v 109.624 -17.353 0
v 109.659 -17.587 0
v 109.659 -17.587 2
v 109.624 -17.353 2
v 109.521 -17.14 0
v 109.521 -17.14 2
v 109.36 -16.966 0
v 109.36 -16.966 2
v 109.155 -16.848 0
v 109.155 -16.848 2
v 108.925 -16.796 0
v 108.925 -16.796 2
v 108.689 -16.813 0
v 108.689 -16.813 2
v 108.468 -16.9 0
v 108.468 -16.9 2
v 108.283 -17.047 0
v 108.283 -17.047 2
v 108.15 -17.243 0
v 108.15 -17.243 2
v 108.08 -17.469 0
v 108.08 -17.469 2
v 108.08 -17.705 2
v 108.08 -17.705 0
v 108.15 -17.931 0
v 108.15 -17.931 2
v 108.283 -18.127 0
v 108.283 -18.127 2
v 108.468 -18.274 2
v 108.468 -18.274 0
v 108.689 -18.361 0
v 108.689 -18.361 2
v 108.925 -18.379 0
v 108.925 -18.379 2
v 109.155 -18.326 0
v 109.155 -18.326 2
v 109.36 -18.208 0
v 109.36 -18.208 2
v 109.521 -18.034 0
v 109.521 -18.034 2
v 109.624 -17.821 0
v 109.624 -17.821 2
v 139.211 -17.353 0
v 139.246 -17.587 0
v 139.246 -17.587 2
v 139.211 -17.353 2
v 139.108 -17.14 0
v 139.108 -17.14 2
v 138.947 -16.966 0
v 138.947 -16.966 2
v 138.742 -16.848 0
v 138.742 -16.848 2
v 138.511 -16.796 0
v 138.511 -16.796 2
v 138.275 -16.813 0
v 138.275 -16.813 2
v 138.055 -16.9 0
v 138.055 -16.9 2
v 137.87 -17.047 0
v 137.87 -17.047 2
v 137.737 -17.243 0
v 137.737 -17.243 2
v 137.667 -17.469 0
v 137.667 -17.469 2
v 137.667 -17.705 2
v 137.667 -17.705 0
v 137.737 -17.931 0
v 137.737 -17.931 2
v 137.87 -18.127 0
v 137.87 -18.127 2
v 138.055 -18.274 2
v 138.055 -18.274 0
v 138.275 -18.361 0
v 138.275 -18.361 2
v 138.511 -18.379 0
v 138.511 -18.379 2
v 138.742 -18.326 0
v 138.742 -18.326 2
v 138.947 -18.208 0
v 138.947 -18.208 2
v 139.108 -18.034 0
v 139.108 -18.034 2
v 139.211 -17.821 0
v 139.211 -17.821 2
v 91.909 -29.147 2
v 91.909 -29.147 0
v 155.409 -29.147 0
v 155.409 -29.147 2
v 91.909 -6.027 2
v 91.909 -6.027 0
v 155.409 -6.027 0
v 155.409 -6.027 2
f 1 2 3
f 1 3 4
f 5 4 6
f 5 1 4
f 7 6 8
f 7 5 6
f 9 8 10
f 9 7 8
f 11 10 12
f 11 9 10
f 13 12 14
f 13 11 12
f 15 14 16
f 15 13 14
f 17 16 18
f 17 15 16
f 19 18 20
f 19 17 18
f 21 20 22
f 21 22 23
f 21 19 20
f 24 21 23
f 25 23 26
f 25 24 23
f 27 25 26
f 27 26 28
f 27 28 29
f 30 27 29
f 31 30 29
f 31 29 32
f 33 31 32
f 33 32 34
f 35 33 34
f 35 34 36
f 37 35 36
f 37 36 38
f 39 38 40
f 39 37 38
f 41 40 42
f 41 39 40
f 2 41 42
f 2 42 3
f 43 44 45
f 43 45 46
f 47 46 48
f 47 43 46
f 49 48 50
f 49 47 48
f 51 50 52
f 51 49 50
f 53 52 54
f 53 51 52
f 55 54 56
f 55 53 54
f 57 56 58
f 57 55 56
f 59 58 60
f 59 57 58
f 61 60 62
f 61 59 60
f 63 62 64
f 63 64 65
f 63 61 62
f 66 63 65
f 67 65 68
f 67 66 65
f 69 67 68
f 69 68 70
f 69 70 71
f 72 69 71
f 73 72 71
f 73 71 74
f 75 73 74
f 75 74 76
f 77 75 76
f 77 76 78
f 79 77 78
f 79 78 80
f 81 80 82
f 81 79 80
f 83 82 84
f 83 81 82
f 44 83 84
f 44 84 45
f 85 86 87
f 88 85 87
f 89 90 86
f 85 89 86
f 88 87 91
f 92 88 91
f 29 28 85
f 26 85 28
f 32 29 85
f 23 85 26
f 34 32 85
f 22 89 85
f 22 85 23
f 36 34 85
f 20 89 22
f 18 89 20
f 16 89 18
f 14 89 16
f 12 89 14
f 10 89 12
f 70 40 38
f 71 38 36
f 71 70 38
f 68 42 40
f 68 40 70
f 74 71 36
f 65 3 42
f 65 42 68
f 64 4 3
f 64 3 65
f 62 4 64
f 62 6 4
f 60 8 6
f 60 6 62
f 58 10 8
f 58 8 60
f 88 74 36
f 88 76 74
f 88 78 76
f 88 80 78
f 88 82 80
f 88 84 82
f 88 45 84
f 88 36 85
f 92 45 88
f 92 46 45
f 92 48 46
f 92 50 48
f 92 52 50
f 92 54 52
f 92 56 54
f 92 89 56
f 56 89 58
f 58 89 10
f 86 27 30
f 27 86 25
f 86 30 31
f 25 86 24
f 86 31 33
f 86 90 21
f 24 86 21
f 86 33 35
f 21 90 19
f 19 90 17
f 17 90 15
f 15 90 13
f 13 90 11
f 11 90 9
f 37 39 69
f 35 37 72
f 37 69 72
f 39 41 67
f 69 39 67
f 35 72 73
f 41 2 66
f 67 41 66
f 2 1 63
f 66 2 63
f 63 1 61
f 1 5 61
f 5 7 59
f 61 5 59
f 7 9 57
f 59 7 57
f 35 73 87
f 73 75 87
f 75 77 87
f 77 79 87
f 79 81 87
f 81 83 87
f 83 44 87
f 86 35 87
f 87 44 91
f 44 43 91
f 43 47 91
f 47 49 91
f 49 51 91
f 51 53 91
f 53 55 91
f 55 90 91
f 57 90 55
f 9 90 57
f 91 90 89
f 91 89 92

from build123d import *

# Parameters (mm, degrees)
MODEL_W             = 63.5
MODEL_H             = 12.7
MODEL_R             = 0.79375
MODEL_H_2           = 5.209784437
MODEL_H_3           = 5.209784436
BOSS_EXTRUDE1_DEPTH = 2


with BuildPart() as part:
    # Model → Boss-Extrude1 (new body)
    with BuildSketch(Plane.XY):
        with Locations((123.6587005, -17.587063894)):
            Rectangle(MODEL_W, MODEL_H)
        with Locations((108.865320346, -17.587063894)):
            Circle(MODEL_R, mode=Mode.SUBTRACT)
        with Locations((138.452080654, -17.587063894)):
            Circle(MODEL_R, mode=Mode.SUBTRACT)
        with Locations((123.6587005, -8.632171676)):
            Rectangle(MODEL_W, MODEL_H_2)
        with Locations((123.6587005, -26.541956112)):
            Rectangle(MODEL_W, MODEL_H_3)
    extrude(amount=BOSS_EXTRUDE1_DEPTH)


solid = part.part
